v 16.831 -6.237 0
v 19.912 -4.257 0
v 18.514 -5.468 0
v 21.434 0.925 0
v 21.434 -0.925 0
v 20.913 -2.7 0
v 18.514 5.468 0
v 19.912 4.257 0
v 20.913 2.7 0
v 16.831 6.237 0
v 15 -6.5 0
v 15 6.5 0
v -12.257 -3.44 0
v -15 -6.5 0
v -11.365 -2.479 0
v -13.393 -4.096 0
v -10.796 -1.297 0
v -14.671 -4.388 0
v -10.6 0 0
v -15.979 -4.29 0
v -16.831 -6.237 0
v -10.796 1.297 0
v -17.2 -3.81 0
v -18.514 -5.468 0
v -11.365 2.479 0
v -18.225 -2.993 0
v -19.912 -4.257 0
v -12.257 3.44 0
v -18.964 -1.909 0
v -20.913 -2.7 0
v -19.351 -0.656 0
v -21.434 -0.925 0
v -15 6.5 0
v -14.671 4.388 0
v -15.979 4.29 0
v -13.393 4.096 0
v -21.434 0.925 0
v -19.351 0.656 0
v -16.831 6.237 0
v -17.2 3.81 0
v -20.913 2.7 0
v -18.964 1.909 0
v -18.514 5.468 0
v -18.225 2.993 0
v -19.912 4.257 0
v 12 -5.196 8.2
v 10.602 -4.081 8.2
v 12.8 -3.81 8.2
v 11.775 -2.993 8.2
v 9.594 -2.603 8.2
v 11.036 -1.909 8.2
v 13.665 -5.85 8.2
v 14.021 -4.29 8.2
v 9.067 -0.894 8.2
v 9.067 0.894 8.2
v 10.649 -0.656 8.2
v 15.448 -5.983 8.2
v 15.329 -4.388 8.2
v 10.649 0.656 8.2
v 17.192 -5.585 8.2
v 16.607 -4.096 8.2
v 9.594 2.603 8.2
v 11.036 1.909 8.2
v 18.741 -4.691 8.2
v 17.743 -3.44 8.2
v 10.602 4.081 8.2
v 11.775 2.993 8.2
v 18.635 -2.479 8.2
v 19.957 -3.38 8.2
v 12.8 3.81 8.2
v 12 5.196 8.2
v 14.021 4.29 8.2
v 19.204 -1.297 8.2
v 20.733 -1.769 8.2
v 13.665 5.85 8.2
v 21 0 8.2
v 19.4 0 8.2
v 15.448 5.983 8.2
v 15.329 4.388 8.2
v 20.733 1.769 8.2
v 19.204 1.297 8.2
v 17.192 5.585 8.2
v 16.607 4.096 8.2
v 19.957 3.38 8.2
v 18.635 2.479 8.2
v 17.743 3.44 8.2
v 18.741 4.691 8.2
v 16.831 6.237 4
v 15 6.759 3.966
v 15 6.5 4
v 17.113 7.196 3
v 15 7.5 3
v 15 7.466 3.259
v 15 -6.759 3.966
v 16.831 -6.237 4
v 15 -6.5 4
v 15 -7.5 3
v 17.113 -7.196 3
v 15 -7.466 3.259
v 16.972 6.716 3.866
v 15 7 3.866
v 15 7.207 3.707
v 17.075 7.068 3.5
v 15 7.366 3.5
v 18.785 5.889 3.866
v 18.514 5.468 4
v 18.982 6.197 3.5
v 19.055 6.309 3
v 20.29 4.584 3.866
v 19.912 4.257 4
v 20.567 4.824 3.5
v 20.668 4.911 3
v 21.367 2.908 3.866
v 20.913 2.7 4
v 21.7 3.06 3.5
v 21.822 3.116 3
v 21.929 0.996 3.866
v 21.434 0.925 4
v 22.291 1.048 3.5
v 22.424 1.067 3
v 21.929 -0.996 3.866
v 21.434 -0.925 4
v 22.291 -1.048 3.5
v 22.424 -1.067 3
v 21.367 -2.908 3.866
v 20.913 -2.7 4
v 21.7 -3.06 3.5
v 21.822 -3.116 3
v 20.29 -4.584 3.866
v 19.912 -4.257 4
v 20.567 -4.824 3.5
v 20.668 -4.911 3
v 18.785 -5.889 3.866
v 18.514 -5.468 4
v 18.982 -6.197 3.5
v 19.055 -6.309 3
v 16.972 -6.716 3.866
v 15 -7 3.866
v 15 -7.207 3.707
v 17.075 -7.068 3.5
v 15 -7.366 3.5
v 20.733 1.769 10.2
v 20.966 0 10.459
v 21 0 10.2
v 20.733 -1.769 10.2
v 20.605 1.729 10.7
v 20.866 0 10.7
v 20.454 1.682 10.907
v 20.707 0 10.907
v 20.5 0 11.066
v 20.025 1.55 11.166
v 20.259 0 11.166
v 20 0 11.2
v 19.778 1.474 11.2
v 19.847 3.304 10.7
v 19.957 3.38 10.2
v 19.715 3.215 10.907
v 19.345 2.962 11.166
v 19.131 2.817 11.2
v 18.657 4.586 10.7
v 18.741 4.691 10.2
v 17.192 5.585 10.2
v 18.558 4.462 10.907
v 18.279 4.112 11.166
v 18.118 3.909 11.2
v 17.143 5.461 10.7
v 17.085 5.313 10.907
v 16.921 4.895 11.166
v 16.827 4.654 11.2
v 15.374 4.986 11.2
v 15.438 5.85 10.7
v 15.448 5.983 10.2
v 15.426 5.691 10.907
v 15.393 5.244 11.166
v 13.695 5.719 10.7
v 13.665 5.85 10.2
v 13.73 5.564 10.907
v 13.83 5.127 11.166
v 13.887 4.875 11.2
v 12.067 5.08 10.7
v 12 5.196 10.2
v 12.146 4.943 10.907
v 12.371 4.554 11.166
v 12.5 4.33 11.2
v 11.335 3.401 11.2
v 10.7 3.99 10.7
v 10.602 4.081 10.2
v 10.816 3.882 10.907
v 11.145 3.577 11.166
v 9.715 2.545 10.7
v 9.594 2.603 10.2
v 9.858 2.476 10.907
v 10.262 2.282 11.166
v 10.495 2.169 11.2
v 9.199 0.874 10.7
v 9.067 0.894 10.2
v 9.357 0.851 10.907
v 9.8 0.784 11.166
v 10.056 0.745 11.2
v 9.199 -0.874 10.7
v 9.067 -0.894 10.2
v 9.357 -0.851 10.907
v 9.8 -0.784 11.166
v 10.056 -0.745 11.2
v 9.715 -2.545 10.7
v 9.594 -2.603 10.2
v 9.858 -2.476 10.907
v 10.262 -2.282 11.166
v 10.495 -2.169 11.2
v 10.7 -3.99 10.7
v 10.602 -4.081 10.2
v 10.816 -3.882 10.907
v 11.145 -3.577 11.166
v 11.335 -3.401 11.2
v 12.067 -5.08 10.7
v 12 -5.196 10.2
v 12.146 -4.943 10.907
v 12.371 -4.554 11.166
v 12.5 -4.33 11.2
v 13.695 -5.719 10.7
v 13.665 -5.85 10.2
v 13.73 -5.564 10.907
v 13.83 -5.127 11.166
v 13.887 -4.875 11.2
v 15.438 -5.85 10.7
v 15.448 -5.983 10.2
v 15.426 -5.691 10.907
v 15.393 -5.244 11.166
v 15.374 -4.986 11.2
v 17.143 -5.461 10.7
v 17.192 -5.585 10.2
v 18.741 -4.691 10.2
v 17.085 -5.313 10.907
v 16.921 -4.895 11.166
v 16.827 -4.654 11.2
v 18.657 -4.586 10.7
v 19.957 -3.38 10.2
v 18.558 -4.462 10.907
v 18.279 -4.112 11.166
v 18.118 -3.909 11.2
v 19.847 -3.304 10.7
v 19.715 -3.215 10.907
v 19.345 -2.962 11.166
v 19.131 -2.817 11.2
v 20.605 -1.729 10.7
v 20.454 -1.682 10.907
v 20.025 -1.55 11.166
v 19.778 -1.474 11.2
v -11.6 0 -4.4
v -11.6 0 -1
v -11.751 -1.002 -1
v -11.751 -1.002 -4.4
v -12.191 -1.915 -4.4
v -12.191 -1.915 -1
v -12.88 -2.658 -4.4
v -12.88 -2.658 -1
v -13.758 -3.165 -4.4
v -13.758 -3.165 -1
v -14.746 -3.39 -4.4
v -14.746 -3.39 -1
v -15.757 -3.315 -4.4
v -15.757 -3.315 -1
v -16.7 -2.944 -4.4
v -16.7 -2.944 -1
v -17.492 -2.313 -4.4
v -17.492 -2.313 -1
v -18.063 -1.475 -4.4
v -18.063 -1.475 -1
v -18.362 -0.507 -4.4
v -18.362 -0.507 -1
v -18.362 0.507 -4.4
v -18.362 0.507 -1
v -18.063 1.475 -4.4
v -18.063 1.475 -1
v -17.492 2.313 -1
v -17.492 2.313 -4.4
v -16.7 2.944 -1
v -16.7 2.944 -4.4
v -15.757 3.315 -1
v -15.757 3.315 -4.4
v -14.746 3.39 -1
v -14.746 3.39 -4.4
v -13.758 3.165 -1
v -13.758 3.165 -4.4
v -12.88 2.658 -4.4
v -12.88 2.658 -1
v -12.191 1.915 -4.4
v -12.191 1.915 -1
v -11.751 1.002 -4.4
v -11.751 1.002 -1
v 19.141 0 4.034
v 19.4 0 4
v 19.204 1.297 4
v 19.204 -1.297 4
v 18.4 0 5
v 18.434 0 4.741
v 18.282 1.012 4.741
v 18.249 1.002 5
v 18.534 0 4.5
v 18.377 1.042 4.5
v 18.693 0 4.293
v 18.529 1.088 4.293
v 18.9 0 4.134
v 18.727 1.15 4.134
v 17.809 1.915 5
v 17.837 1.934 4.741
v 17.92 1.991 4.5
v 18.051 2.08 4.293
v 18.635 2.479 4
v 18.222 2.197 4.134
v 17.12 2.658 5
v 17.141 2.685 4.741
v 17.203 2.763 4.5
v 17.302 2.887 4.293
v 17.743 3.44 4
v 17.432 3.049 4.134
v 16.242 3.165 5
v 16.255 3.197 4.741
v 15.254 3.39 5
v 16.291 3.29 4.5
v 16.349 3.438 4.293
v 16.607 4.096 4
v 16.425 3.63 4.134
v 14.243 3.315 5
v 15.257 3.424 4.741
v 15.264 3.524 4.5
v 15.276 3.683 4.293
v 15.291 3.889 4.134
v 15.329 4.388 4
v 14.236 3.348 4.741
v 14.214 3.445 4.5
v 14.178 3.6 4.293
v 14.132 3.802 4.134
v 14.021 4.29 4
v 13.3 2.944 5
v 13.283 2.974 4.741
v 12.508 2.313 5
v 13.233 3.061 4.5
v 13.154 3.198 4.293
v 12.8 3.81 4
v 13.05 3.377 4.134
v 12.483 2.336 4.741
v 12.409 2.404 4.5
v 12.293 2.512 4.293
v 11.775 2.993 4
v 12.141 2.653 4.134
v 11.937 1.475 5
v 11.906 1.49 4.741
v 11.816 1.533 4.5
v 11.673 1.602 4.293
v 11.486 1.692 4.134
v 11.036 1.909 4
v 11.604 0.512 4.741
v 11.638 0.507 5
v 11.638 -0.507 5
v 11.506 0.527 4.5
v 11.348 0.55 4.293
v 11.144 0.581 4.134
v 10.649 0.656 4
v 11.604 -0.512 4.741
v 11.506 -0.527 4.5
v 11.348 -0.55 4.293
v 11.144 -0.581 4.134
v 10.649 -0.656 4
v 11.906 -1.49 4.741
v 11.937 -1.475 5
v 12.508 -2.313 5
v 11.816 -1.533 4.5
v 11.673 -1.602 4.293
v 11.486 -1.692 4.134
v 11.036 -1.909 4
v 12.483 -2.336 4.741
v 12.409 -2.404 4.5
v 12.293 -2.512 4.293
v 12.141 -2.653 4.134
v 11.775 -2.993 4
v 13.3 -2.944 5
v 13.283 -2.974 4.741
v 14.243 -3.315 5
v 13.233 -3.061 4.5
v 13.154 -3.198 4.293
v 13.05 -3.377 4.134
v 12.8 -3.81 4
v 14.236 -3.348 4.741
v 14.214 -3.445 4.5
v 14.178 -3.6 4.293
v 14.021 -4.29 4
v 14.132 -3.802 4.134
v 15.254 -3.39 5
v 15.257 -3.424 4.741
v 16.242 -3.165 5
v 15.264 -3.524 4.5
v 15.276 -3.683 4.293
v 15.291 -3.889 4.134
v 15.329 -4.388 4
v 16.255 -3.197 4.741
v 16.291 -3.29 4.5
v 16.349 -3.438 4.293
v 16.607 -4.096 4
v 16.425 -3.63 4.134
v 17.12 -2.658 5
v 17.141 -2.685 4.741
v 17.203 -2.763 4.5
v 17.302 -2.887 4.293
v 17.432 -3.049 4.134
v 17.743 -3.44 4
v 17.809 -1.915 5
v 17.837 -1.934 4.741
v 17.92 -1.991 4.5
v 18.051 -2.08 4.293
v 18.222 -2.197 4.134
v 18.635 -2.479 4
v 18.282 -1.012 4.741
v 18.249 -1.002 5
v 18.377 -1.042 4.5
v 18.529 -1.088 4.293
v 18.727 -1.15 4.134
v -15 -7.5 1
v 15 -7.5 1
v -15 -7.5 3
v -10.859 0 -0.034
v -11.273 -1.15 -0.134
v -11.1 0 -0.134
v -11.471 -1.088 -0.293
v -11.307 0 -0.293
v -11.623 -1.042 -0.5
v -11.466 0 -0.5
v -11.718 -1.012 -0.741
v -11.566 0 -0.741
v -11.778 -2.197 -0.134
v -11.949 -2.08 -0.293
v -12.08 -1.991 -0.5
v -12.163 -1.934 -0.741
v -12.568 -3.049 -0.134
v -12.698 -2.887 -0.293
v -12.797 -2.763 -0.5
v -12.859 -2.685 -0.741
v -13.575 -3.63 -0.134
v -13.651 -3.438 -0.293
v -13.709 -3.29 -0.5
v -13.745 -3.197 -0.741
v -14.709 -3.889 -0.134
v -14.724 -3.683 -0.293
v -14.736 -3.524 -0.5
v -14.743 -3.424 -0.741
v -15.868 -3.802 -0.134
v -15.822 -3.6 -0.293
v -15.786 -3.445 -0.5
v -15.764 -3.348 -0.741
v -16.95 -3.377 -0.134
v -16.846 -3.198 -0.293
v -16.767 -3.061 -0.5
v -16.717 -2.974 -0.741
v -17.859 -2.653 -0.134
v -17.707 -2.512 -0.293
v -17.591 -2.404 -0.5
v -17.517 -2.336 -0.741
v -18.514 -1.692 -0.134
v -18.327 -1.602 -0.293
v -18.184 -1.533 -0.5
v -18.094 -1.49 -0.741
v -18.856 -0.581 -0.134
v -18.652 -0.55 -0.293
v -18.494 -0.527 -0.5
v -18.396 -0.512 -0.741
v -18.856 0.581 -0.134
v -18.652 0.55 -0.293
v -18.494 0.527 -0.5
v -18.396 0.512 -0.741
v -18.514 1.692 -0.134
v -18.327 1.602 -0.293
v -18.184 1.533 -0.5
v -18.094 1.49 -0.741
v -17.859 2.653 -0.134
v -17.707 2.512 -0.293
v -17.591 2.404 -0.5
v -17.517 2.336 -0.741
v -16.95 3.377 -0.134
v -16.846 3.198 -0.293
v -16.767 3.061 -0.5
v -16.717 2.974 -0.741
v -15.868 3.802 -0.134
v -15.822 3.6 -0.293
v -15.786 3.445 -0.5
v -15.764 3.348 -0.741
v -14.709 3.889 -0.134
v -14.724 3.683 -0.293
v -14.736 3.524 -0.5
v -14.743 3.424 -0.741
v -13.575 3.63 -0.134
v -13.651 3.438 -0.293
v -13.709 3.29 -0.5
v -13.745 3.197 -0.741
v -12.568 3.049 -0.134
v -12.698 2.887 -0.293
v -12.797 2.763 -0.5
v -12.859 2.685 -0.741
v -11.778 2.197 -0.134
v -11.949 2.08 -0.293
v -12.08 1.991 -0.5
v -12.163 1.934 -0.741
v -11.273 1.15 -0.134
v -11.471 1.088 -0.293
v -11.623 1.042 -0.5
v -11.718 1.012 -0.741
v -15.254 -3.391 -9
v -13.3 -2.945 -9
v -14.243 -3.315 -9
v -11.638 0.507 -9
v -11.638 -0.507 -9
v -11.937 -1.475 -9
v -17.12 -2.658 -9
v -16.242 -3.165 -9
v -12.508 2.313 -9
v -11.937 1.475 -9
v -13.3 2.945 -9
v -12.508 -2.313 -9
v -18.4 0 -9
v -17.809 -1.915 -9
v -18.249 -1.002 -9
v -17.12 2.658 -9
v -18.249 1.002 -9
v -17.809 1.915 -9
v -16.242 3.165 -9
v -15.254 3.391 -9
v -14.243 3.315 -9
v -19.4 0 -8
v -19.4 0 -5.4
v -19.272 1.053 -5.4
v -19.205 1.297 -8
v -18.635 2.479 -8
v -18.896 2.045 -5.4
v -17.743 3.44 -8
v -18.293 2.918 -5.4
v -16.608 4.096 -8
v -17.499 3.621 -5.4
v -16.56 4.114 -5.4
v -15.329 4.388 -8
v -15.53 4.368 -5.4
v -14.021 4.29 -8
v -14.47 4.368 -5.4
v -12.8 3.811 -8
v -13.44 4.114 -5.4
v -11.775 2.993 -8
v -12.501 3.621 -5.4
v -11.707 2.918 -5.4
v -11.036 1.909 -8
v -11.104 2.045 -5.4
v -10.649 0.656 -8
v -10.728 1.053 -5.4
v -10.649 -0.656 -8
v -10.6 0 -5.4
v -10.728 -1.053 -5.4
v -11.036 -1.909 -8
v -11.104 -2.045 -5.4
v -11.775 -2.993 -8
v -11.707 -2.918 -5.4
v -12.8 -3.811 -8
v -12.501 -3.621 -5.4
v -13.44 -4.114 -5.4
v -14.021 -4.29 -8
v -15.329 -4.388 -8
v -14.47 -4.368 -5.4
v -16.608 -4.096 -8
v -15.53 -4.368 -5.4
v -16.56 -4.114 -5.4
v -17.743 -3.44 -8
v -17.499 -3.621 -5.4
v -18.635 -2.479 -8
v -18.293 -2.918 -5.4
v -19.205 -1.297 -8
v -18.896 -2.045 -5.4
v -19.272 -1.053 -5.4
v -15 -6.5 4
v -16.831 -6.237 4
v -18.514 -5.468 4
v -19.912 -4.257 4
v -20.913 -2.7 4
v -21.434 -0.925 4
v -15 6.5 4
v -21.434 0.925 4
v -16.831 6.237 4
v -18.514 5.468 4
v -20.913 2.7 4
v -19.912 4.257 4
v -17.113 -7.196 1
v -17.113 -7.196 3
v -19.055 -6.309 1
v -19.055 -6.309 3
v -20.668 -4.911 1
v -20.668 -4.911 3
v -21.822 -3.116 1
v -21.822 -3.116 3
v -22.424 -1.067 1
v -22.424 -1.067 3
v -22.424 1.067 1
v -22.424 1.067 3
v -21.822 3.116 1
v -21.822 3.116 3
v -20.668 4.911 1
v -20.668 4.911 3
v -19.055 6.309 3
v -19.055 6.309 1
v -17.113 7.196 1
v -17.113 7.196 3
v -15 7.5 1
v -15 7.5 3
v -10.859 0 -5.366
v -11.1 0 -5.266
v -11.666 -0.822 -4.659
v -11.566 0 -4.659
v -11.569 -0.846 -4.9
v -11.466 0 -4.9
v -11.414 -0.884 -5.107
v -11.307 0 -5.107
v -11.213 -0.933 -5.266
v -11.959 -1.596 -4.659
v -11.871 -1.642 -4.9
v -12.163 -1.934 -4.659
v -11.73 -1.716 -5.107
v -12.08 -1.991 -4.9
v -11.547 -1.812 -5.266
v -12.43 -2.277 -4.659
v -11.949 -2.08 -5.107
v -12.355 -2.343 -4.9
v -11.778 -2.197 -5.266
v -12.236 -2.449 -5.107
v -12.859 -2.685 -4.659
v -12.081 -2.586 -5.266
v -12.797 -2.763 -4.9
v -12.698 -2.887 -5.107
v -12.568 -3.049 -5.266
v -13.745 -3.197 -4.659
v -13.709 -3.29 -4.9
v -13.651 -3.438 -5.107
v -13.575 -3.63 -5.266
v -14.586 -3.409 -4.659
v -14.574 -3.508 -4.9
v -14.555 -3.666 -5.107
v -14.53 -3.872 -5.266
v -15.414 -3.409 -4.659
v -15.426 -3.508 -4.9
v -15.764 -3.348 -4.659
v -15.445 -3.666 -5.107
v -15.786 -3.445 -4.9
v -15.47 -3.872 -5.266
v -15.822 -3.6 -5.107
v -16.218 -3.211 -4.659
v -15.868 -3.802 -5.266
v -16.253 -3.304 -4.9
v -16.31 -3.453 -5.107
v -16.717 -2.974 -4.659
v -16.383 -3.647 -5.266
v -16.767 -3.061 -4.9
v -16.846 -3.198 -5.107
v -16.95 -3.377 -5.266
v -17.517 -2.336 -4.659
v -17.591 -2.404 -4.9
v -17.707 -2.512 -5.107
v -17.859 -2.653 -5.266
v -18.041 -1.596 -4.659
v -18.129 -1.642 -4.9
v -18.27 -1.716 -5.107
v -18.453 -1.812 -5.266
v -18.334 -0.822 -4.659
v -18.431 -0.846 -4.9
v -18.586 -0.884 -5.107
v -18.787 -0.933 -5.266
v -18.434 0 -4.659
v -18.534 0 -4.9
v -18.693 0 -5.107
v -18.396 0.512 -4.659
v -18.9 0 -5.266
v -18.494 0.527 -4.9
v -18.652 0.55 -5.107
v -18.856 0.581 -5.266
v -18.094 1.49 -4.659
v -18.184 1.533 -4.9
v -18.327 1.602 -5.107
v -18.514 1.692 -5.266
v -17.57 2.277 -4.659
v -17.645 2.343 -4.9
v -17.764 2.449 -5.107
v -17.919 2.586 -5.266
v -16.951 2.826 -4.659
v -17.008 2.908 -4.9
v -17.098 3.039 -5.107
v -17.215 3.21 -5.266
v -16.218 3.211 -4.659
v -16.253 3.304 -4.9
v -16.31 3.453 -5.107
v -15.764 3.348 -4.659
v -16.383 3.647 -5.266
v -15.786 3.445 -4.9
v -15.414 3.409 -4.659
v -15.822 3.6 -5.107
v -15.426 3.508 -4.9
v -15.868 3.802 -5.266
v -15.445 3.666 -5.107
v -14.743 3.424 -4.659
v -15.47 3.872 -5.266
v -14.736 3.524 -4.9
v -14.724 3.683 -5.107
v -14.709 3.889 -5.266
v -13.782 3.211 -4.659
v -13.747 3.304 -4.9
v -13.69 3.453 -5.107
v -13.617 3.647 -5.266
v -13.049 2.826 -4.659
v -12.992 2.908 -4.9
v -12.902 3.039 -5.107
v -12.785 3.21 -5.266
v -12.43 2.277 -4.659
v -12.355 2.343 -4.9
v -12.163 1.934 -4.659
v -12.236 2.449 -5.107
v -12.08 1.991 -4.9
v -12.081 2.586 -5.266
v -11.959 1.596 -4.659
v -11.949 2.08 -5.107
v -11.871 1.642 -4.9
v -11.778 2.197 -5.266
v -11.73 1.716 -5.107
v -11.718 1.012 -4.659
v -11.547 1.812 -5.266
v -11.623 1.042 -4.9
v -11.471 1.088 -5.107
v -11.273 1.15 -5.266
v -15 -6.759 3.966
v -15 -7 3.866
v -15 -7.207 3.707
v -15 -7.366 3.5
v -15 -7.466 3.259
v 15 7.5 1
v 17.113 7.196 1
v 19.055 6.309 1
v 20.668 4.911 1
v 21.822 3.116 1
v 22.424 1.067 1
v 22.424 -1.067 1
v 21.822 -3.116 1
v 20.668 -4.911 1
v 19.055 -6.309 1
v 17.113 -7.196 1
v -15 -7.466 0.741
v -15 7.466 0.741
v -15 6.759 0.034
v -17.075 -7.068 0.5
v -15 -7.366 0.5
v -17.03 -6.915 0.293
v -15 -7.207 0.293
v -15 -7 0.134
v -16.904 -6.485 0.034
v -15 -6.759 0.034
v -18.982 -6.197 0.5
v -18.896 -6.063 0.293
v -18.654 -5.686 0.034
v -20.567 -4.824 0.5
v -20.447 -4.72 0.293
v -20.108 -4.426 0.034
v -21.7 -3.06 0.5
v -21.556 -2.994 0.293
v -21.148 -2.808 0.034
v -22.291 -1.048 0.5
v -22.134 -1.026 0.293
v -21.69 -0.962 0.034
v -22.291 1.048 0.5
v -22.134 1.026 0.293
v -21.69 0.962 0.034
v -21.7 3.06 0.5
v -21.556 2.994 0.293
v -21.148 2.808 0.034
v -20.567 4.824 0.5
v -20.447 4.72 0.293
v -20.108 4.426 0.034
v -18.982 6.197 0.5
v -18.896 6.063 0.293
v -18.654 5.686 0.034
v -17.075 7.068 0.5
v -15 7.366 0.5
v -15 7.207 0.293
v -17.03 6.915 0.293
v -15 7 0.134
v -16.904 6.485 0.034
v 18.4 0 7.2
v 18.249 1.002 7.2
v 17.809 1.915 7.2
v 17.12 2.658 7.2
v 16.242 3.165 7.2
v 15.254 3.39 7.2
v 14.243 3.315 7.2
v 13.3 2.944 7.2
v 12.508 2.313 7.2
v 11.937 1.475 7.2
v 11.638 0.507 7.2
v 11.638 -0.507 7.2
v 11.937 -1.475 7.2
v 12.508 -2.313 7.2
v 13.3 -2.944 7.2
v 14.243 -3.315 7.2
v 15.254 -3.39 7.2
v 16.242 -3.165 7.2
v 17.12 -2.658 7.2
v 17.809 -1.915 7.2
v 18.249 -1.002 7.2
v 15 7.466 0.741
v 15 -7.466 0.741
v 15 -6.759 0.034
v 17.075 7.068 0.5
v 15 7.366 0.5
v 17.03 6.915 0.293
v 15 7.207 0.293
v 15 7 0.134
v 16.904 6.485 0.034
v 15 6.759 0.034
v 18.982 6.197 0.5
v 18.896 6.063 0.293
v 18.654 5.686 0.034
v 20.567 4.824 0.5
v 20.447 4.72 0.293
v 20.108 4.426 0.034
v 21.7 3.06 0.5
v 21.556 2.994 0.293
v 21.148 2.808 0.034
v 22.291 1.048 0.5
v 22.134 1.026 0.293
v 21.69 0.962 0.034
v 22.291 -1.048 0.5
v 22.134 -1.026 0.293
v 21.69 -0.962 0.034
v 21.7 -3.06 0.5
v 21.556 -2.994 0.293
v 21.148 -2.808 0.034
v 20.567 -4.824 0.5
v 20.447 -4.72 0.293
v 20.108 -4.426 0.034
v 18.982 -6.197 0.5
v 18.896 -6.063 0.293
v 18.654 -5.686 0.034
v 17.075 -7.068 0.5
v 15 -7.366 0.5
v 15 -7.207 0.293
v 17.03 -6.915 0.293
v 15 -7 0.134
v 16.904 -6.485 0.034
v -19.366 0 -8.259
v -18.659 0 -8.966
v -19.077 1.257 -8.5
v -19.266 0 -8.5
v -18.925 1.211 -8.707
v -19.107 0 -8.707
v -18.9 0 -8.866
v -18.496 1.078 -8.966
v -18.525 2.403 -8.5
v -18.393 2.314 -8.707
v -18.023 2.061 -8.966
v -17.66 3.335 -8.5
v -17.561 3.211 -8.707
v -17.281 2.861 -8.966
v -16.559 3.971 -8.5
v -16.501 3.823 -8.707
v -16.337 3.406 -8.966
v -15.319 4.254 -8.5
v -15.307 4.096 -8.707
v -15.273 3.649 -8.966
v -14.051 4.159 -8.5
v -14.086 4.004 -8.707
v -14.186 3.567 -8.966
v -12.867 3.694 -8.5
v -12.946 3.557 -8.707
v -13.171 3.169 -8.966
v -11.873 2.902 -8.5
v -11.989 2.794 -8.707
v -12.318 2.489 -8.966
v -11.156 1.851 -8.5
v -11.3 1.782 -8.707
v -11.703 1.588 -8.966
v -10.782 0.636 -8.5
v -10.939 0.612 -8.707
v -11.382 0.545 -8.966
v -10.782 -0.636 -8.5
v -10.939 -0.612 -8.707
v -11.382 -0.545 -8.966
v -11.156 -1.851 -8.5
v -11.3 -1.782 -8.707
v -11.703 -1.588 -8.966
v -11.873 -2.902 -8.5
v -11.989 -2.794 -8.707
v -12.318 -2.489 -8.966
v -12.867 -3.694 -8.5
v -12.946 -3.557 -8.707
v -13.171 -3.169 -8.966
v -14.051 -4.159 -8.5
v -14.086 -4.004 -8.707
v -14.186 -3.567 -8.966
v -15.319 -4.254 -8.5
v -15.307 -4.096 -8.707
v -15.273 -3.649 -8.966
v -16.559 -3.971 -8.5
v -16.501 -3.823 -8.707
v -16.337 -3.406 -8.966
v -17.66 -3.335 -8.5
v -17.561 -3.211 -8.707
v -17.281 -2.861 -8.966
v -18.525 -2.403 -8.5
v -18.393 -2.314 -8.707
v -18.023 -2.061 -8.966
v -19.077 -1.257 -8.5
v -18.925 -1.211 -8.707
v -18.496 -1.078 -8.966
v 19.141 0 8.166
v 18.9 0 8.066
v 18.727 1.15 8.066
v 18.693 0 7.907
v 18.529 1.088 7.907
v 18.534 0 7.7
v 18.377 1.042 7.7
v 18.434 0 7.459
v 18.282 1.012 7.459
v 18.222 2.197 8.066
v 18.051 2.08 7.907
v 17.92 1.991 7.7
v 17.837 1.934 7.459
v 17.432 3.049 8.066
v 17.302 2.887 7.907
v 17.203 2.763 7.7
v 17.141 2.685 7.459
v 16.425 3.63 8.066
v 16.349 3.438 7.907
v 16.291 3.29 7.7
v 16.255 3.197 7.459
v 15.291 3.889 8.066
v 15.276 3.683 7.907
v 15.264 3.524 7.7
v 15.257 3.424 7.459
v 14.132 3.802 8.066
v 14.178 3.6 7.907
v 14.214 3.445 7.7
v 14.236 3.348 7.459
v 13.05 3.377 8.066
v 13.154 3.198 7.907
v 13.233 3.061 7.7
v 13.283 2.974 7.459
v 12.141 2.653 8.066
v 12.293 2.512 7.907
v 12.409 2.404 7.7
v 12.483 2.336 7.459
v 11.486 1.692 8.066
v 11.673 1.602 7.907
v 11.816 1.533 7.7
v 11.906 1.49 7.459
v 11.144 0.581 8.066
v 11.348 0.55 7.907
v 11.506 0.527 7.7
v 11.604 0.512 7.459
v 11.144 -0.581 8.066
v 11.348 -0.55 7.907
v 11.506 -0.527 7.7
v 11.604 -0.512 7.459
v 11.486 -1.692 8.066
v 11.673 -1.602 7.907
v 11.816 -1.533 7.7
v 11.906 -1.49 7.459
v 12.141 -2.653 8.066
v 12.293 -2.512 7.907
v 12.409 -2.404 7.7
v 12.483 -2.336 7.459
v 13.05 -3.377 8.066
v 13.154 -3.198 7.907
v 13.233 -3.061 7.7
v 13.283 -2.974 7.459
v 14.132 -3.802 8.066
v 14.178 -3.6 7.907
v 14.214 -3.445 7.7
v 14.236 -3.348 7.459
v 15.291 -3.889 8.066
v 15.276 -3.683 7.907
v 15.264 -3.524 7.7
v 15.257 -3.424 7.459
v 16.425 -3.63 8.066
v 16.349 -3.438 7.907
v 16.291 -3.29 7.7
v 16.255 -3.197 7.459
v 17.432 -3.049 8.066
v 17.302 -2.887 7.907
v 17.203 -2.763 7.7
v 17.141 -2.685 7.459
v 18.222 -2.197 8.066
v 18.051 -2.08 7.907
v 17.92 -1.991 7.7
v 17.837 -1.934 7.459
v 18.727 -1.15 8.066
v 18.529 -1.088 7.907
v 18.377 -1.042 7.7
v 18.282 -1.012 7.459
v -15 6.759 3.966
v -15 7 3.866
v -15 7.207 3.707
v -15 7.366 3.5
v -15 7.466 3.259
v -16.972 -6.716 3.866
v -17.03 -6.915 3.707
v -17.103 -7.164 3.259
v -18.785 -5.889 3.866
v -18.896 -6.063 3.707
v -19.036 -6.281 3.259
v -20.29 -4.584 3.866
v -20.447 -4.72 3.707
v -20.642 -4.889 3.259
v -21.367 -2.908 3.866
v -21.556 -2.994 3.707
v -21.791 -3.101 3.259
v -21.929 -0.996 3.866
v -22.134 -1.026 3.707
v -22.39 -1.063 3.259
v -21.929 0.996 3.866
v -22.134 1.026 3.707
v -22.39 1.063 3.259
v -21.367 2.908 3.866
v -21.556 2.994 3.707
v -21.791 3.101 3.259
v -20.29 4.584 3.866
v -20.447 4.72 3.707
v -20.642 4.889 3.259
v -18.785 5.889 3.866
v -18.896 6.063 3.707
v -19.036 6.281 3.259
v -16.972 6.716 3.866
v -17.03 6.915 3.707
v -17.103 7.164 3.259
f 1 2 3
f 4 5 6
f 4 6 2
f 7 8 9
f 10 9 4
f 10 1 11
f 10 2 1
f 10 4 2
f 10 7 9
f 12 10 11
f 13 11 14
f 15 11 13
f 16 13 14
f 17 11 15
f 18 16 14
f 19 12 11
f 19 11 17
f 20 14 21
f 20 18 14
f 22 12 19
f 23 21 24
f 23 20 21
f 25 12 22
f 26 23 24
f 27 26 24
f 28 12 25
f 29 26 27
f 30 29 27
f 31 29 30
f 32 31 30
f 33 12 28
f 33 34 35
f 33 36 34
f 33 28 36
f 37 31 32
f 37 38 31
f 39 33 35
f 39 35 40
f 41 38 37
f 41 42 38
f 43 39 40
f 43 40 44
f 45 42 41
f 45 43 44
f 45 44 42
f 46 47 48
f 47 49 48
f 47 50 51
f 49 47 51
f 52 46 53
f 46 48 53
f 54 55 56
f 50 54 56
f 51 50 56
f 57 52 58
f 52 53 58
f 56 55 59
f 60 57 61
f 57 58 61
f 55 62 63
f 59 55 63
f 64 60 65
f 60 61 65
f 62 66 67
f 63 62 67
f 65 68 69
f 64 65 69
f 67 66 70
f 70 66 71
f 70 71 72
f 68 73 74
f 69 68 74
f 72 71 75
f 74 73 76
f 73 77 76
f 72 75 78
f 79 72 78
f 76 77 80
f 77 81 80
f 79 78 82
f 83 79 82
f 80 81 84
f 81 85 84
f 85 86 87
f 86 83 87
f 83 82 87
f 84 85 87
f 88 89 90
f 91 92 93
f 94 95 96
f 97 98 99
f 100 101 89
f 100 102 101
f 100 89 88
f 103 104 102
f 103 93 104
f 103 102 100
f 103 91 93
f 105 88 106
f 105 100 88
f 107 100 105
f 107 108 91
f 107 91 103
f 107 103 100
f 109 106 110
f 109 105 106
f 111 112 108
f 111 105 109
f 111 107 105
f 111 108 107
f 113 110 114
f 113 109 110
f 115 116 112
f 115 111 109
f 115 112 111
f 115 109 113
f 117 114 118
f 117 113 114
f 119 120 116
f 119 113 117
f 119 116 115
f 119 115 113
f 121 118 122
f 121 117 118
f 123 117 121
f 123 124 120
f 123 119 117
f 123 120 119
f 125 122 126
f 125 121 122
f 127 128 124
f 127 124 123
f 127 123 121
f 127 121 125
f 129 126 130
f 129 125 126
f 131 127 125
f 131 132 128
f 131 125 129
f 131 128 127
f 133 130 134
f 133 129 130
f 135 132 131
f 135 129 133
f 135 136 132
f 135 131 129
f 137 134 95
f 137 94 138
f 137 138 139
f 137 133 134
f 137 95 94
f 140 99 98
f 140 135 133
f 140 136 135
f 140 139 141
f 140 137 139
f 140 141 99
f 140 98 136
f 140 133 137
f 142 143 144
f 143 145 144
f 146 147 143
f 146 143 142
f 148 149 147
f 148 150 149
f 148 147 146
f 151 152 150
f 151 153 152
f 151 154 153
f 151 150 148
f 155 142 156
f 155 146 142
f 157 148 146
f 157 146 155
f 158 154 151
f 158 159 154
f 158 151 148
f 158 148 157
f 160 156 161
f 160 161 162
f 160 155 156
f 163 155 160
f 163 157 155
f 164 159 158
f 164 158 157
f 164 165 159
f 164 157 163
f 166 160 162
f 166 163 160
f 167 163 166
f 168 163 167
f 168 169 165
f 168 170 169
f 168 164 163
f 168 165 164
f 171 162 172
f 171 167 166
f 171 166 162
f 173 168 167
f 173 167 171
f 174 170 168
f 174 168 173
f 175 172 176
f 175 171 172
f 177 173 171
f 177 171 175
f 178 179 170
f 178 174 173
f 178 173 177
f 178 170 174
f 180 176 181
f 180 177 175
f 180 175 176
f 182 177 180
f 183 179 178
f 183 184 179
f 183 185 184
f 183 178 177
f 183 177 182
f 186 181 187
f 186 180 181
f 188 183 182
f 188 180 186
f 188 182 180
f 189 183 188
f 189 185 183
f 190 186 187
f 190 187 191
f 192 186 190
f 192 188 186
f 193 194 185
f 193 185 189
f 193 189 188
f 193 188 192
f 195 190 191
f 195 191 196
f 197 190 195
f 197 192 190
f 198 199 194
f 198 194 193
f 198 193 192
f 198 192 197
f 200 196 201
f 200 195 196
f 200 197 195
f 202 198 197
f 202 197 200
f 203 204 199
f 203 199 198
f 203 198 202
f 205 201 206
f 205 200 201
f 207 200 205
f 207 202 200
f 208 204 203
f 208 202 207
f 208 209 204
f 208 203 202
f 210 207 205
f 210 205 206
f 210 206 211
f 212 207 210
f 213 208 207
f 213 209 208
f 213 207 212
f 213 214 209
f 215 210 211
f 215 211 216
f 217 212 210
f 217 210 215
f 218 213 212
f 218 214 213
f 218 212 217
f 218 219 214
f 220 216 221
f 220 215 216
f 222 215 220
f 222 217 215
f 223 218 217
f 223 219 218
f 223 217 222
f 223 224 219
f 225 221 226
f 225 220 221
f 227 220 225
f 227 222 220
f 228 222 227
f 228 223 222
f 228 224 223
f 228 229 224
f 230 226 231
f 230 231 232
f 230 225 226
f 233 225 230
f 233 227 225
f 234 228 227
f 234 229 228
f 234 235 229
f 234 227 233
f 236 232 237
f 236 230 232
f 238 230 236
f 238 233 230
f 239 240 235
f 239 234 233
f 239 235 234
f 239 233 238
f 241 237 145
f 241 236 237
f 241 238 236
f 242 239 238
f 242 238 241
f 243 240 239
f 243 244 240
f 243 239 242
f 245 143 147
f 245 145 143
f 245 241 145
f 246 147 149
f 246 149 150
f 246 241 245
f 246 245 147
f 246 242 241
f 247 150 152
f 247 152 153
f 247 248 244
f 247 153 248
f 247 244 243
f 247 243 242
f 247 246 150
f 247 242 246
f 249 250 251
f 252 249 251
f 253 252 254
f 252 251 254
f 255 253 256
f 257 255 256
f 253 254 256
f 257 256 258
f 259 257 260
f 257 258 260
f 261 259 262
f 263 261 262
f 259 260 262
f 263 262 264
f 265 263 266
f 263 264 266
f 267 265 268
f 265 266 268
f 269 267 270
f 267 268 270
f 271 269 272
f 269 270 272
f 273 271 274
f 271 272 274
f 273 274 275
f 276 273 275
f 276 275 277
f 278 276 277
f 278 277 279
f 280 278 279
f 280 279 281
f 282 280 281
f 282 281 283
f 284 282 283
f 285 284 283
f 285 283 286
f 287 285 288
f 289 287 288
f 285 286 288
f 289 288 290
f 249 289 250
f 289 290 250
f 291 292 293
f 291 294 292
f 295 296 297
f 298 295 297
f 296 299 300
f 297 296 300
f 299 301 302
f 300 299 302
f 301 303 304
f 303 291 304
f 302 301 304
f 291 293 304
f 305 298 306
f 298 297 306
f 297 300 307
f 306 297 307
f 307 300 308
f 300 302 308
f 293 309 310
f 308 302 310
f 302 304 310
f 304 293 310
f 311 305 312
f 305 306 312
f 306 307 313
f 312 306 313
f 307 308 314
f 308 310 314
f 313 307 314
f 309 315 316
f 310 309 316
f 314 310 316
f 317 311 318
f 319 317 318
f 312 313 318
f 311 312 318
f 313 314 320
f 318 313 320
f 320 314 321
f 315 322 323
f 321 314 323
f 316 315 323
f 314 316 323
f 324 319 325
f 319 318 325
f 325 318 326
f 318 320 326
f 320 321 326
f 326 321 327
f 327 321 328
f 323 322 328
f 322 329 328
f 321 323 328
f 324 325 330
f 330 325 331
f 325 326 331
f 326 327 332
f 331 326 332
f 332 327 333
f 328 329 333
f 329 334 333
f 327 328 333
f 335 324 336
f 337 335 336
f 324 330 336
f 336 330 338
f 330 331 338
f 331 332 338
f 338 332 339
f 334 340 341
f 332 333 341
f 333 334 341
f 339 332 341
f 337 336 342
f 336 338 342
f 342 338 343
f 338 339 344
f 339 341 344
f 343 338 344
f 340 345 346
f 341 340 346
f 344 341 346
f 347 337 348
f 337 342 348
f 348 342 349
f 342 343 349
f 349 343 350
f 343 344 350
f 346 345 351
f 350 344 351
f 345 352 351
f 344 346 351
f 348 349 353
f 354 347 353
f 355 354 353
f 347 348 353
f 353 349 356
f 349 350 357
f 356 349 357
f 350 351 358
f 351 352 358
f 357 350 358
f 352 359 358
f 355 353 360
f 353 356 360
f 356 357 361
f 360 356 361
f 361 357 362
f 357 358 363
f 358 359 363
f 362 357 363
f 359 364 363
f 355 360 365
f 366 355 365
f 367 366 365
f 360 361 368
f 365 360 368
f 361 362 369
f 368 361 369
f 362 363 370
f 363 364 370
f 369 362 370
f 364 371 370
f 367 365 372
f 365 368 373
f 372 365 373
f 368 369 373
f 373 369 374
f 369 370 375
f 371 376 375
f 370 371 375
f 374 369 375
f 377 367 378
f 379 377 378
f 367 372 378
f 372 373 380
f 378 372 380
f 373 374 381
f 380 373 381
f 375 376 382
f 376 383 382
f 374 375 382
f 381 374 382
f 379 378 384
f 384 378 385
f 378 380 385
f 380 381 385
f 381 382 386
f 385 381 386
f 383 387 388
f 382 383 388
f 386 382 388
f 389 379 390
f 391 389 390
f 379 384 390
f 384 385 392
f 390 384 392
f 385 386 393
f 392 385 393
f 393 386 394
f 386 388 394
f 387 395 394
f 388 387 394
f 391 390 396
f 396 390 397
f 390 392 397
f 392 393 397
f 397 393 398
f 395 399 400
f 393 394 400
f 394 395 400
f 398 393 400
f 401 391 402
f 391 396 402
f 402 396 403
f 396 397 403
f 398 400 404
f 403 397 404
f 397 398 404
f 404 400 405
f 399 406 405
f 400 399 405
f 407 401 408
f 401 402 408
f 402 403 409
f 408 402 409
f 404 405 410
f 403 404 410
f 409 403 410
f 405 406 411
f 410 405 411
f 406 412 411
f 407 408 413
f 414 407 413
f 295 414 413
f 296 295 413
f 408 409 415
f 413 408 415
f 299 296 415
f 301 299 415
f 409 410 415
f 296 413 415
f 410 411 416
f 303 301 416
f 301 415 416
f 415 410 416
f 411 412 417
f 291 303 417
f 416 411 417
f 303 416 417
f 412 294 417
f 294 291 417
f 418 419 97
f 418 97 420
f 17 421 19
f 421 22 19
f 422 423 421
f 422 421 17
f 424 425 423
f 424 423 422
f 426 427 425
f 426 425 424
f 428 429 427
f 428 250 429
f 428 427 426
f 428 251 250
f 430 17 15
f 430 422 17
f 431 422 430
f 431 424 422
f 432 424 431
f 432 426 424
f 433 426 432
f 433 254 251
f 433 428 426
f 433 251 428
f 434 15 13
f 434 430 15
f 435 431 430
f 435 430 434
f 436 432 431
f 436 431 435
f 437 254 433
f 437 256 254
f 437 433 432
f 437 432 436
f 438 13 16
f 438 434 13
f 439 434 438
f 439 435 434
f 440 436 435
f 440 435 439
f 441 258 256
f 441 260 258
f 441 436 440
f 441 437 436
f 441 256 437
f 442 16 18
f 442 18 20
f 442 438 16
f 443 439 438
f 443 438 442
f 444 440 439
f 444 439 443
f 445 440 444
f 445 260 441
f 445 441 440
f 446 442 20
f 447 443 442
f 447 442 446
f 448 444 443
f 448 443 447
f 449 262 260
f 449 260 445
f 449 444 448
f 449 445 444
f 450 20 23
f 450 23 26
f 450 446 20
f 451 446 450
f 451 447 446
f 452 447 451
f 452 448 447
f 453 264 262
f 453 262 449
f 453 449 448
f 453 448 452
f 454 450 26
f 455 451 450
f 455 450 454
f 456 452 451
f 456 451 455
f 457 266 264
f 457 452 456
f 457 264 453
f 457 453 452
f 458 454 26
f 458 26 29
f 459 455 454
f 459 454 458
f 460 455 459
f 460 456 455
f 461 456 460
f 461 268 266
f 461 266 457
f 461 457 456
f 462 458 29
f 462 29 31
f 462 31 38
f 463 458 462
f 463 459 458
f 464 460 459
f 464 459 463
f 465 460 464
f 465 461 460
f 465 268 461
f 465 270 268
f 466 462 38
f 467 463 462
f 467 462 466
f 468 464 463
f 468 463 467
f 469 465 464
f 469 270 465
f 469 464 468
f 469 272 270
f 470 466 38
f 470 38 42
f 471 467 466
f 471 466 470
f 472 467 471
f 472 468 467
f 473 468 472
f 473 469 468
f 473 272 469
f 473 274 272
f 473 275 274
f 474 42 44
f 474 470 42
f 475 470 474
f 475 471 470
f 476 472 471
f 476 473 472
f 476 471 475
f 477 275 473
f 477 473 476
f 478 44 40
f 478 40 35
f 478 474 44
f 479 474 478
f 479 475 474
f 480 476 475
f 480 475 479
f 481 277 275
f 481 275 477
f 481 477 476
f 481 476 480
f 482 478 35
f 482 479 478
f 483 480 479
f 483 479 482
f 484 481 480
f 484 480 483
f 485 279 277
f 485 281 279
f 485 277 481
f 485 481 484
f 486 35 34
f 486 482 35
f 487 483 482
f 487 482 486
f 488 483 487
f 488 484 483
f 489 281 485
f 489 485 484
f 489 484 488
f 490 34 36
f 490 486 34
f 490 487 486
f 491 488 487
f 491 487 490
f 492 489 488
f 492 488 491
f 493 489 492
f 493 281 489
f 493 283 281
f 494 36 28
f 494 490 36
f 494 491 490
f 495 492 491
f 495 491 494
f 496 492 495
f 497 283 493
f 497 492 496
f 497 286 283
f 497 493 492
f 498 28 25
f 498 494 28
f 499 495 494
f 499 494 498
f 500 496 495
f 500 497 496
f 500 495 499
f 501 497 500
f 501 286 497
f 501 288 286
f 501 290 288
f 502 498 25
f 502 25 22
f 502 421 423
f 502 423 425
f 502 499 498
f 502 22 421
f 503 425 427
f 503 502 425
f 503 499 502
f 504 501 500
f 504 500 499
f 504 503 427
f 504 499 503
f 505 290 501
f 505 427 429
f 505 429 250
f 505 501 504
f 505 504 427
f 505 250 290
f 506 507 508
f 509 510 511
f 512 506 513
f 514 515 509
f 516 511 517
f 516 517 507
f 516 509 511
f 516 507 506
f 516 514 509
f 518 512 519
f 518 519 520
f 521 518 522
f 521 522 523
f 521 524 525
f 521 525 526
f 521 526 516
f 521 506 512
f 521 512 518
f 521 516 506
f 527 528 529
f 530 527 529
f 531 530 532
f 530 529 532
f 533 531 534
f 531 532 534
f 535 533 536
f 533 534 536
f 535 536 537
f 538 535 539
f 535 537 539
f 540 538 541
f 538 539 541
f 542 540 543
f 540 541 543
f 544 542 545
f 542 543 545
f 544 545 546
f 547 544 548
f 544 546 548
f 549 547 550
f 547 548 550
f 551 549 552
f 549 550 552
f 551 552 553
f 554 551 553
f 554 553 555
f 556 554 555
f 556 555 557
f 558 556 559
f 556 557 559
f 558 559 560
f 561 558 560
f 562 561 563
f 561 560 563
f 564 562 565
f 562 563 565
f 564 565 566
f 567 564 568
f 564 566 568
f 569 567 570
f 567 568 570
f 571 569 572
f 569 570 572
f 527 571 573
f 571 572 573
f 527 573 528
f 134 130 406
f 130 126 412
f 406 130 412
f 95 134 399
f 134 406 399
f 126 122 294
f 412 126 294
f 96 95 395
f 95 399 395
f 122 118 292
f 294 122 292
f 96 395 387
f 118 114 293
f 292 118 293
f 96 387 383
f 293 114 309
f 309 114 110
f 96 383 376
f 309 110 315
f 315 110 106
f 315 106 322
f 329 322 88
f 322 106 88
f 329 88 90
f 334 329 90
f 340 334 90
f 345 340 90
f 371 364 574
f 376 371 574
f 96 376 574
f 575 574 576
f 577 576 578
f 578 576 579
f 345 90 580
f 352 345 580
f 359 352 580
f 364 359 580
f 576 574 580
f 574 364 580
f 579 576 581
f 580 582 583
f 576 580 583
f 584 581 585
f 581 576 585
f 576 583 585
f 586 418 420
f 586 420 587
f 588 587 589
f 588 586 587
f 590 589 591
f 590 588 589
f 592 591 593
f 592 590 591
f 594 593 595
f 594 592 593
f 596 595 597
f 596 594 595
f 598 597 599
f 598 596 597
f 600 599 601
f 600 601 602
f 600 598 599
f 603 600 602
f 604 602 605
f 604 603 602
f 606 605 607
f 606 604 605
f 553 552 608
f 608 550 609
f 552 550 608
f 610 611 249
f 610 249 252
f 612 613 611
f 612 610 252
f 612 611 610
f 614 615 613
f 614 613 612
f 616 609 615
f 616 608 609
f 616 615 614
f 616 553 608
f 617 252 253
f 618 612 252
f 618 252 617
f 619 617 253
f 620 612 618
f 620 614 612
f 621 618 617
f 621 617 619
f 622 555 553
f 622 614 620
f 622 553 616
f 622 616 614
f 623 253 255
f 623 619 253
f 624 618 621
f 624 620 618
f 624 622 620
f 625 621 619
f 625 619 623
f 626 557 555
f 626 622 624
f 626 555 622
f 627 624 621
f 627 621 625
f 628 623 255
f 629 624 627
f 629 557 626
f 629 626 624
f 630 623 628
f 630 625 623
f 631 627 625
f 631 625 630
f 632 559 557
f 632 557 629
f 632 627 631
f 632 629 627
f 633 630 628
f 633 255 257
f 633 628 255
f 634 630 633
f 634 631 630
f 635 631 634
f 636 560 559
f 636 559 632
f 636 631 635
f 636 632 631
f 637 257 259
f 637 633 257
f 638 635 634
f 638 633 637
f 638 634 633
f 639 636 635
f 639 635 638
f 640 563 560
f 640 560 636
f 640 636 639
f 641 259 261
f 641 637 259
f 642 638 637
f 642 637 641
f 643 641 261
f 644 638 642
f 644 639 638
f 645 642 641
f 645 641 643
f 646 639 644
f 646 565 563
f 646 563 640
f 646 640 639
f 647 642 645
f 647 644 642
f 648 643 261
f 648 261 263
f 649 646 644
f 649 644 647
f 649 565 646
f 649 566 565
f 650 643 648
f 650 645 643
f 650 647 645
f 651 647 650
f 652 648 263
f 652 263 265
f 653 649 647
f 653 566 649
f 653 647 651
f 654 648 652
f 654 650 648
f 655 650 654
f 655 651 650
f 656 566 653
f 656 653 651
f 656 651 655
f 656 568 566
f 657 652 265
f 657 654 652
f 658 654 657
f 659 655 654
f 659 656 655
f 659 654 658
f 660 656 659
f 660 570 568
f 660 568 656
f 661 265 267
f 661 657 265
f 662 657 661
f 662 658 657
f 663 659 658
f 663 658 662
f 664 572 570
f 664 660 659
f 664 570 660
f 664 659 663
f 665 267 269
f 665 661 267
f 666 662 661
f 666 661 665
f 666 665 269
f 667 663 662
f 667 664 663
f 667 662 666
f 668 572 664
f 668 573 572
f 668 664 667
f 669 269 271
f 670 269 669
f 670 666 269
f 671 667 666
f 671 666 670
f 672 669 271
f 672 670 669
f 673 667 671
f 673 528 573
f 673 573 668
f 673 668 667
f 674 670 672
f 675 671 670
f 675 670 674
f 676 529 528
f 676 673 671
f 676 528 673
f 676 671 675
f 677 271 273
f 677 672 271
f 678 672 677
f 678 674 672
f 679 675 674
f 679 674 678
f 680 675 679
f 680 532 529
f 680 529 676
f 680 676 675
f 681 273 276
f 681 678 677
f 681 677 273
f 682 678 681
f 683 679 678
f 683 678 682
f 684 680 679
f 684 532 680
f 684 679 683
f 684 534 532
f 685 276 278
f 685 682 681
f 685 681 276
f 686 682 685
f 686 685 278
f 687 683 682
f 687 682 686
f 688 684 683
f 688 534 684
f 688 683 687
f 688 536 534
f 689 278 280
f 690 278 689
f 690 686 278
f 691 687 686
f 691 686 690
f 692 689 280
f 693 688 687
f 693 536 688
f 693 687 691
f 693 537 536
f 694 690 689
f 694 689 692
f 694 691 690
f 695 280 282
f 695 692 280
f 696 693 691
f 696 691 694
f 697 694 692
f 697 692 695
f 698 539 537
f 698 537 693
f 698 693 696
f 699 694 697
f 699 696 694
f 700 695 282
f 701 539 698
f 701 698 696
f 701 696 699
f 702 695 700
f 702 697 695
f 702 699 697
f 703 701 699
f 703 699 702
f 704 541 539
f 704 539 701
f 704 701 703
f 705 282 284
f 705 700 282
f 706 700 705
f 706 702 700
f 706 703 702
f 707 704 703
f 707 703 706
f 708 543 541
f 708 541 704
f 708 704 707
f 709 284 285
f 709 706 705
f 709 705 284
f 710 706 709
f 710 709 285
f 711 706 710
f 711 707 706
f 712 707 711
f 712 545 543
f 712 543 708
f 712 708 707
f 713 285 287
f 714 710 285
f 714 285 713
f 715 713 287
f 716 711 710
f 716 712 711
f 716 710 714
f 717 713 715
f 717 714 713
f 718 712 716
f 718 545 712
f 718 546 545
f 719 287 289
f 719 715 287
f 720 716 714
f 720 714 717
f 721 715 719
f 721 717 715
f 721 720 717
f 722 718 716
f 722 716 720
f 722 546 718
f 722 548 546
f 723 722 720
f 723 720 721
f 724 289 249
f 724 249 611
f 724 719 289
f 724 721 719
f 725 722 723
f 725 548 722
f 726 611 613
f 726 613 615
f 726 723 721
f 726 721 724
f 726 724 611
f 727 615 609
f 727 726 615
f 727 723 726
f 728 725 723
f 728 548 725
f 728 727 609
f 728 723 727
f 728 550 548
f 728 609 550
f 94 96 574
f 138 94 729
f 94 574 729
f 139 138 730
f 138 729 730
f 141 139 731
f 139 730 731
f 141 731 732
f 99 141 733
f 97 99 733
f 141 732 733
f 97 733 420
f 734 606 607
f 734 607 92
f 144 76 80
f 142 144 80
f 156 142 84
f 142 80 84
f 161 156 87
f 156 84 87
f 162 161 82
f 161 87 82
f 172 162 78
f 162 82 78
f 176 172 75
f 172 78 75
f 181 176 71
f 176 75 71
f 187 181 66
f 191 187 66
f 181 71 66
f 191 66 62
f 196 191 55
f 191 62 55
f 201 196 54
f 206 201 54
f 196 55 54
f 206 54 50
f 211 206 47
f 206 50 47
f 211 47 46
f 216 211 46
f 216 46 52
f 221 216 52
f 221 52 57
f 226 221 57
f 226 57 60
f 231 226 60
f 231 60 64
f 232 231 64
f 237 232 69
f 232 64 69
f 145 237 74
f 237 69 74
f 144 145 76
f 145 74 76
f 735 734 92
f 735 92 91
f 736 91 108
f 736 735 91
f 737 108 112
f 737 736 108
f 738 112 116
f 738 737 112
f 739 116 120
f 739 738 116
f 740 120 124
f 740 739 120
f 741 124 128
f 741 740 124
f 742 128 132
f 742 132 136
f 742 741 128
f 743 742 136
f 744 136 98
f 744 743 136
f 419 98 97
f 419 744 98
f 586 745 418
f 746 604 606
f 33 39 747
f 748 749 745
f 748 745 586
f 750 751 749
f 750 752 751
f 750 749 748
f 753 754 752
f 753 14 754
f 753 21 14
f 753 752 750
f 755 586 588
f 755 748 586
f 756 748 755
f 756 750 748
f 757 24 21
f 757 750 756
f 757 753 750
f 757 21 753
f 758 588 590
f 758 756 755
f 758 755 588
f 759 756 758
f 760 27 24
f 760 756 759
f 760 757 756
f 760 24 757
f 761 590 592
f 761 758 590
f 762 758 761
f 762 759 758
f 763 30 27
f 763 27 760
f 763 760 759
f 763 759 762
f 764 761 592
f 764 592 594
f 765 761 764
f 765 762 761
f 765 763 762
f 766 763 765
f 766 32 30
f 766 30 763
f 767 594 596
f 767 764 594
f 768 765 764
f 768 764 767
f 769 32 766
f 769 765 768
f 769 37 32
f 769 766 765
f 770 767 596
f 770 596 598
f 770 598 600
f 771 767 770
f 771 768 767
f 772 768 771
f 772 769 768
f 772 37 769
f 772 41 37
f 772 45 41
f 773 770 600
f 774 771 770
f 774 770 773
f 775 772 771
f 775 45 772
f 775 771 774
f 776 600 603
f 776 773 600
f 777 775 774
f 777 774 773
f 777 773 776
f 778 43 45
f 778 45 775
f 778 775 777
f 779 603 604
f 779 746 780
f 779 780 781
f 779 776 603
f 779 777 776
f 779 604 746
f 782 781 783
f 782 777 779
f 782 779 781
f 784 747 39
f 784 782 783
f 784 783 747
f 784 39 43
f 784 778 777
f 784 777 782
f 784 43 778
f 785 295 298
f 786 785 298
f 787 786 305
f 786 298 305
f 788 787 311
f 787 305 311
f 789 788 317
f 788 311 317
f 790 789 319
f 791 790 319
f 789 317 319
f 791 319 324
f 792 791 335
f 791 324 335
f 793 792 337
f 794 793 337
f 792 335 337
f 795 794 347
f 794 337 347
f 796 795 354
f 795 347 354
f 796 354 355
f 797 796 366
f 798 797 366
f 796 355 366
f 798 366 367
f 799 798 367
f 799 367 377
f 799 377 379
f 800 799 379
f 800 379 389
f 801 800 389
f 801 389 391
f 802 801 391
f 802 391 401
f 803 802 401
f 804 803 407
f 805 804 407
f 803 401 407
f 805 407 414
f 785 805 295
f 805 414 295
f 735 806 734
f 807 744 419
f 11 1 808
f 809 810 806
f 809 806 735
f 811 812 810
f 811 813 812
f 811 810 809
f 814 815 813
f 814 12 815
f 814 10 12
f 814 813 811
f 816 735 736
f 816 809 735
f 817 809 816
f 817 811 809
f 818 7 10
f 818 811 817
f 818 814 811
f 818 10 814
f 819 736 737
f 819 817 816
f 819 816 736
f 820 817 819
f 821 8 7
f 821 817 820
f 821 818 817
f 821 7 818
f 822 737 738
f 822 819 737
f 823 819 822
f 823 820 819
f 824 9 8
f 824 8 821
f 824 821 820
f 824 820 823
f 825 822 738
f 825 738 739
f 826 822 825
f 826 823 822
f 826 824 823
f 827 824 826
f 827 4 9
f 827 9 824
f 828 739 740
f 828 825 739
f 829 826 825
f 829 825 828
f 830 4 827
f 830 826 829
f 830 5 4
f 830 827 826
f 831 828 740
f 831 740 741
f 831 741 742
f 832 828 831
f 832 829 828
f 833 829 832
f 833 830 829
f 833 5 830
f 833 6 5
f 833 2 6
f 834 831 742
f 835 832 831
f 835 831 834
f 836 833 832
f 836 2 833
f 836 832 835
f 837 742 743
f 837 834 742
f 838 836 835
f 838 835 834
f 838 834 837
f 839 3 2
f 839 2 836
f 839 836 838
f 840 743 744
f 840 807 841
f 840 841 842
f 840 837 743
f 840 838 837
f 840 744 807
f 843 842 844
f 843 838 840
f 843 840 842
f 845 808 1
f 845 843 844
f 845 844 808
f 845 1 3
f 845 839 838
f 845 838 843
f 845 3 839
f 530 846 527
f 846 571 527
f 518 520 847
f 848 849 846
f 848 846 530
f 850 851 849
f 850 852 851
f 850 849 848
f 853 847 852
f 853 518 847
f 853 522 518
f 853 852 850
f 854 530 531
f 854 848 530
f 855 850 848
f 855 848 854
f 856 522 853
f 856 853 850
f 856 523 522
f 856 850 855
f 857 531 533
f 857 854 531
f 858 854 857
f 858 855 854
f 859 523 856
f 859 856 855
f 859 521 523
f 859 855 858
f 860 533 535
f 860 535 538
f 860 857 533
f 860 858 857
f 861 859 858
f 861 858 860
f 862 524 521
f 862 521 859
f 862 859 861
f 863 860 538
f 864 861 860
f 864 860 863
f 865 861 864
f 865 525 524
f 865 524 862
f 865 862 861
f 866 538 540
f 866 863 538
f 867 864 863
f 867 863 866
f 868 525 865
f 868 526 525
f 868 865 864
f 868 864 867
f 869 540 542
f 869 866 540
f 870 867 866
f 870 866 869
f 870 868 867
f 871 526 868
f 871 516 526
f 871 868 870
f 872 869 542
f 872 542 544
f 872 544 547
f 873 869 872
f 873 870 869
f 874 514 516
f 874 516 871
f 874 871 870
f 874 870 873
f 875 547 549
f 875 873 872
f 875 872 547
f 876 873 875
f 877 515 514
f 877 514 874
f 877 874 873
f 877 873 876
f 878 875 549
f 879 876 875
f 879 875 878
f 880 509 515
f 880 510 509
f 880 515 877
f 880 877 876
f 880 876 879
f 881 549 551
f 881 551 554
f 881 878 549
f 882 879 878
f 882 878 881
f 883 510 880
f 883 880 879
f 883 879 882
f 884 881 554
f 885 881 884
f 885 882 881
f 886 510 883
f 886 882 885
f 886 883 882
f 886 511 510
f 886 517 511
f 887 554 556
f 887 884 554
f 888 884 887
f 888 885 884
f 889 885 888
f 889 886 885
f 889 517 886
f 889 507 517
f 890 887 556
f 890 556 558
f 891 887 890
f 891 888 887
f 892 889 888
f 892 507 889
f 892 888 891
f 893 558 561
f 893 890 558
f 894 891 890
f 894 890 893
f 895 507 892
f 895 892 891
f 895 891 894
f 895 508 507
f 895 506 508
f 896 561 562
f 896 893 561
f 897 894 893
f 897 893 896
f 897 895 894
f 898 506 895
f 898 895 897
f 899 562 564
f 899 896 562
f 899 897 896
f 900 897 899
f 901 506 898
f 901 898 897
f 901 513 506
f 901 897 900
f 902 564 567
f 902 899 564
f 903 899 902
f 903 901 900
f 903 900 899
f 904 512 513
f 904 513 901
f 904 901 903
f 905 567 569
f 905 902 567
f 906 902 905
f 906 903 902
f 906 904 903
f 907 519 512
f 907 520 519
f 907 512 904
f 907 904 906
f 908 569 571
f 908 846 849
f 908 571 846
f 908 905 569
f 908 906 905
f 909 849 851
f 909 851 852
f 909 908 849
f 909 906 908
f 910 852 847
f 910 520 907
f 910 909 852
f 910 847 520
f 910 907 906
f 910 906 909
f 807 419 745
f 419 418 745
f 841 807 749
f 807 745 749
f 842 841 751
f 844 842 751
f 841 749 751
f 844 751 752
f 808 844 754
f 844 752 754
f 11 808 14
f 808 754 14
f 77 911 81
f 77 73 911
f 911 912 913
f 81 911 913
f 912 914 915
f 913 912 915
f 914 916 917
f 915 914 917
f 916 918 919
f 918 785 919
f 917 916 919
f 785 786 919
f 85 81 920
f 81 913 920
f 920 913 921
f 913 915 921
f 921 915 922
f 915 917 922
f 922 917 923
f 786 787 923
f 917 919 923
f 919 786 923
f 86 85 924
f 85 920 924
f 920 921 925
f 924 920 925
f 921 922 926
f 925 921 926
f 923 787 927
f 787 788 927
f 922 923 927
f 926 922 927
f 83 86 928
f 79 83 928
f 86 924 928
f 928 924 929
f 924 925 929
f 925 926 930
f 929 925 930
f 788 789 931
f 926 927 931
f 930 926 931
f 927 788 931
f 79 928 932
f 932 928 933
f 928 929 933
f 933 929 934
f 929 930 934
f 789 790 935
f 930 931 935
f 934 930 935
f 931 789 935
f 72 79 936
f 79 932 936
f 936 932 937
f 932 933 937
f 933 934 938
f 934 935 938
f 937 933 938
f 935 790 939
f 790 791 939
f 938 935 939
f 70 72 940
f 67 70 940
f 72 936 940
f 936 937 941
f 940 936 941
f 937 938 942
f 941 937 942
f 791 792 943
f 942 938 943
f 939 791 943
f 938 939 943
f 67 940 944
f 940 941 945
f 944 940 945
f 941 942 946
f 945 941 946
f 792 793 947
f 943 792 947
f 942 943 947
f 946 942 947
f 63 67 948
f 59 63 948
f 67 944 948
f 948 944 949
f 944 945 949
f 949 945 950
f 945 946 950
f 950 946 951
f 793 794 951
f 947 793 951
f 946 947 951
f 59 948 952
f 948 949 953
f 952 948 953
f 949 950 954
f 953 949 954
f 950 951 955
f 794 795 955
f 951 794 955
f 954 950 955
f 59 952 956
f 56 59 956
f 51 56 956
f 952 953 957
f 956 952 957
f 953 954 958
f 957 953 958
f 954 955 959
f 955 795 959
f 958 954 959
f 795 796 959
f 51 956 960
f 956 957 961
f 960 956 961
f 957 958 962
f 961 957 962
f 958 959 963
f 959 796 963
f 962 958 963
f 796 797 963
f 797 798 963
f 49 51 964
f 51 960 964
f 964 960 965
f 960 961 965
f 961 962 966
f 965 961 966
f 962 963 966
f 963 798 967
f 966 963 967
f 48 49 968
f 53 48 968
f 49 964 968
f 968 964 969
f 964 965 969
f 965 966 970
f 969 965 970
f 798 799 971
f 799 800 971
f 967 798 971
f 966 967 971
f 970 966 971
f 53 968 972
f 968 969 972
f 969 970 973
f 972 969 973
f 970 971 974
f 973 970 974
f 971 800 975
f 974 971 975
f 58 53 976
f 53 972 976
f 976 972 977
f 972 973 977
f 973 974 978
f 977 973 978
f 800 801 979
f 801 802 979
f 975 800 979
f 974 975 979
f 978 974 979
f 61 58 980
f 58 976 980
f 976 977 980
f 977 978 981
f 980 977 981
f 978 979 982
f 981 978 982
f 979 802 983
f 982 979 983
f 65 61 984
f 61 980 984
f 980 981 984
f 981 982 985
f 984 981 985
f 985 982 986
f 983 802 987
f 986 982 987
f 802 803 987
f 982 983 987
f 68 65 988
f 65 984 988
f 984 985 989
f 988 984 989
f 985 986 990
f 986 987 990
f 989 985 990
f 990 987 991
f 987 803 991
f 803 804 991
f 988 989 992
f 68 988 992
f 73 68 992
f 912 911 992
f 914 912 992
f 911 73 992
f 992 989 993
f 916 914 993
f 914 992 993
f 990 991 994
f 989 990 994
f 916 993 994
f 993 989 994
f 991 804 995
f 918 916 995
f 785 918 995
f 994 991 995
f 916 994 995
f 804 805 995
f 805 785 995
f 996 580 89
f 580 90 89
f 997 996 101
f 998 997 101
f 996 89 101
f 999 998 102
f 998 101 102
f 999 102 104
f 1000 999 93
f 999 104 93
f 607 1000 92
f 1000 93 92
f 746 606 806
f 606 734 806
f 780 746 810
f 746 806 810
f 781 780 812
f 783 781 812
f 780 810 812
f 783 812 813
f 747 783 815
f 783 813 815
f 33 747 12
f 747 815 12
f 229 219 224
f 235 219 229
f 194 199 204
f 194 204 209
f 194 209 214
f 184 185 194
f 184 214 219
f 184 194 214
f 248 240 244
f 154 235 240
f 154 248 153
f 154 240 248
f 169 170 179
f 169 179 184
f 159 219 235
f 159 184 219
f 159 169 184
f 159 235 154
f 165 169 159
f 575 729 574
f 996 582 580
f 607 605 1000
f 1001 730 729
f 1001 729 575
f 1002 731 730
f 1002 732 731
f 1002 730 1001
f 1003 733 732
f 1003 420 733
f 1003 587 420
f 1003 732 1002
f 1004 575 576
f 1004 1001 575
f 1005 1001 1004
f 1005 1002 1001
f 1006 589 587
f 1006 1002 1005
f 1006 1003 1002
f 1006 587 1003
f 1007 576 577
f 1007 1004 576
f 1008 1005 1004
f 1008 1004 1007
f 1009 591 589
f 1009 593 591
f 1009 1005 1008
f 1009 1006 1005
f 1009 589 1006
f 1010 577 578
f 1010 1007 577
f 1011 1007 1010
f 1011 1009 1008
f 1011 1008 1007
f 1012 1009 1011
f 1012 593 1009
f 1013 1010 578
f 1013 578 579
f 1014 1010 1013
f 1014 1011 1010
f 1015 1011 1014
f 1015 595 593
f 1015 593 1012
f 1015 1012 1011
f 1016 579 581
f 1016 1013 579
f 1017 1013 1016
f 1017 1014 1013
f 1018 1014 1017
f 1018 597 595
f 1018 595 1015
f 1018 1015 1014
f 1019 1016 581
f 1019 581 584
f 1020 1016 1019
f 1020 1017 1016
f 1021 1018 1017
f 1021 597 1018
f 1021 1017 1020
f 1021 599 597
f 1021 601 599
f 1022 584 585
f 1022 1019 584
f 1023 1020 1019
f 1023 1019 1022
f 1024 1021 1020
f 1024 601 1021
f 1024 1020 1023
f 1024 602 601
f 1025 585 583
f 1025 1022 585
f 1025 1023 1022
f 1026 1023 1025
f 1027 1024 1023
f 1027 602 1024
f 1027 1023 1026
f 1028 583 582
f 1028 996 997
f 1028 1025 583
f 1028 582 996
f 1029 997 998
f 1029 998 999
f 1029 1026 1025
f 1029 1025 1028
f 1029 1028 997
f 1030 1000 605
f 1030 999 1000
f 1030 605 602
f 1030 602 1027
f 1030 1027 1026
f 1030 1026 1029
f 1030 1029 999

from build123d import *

# Parameters (mm, degrees)
SKETCH1_R           = 3.5
BOSS_EXTRUDE2_DEPTH = 4
SKETCH2_R           = 3.4
BOSS_EXTRUDE3_DEPTH = 5.4
SKETCH4_R           = 4.4
BOSS_EXTRUDE4_DEPTH = 3.6
SKETCH5_R           = 3.5
BOSS_EXTRUDE5_DEPTH = 4
SKETCH6_R           = 3.4
BOSS_EXTRUDE6_DEPTH = 4.2
SKETCH7_R           = 6
BOSS_EXTRUDE7_DEPTH = 3
FILLET1_R           = 1


with BuildPart() as part:
    # Sketch1 → Boss-Extrude2 (new body)
    with BuildSketch(Plane.XY):
        with BuildLine():
            Line((-15, 7.5), (15, 7.5))
            ThreePointArc((15, 7.5), (22.5, 0), (15, -7.5))
            Line((15, -7.5), (-15, -7.5))
            ThreePointArc((-15, -7.5), (-22.5, 0), (-15, 7.5))
        make_face()
        with Locations((15, 0)):
            Circle(SKETCH1_R, mode=Mode.SUBTRACT)
    extrude(amount=BOSS_EXTRUDE2_DEPTH)

    # Sketch2 → Boss-Extrude3 (add)
    with BuildSketch(Plane(origin=(0, 0, 0), x_dir=(-1, 0, 0), z_dir=(0, 0, -1))):
        with Locations(Location((15, 0, 0), (0, 0, 180))):
            Circle(SKETCH2_R)
    extrude(amount=BOSS_EXTRUDE3_DEPTH)

    # Sketch4 → Boss-Extrude4 (add)
    with BuildSketch(Plane(origin=(0, 0, -5.4), x_dir=(-1, 0, 0), z_dir=(0, 0, -1))):
        with Locations((15, 0)):
            Circle(SKETCH4_R)
    extrude(amount=BOSS_EXTRUDE4_DEPTH)

    # Sketch5 → Boss-Extrude5 (add)
    with BuildSketch(Plane(origin=(0, 0, 0), x_dir=(-1, 0, 0), z_dir=(0, 0, -1))):
        with Locations((-15, 0)):
            Circle(SKETCH5_R)
    extrude(amount=-BOSS_EXTRUDE5_DEPTH)

    # Sketch6 → Boss-Extrude6 (add)
    with BuildSketch(Plane.XY.offset(4)):
        with Locations((15, 0)):
            Circle(SKETCH6_R)
    extrude(amount=BOSS_EXTRUDE6_DEPTH)

    # Sketch7 → Boss-Extrude7 (add)
    with BuildSketch(Plane.XY.offset(8.2)):
        with Locations((15, 0)):
            Circle(SKETCH7_R)
    extrude(amount=BOSS_EXTRUDE7_DEPTH)

    # Fillet1
    fillet1_edges = [part.edges().sort_by_distance(p)[0] for p in [
        (22.5, 0, 4),
        (0, 7.5, 4),
        (-18.4, 0, 0),
        (-18.4, 0, -5.4),
        (-10.6, 0, -9),
        (11.6, 0, 4),
        (11.6, 0, 8.2),
        (9, 0, 11.2),
        (-22.5, 0, 4),
        (0, 7.5, 0),
        (22.5, 0, 0),
        (0, -7.5, 0),
        (-22.5, 0, 0),
        (0, -7.5, 4),
    ]]
    fillet(fillet1_edges, radius=FILLET1_R - 0.0001)  # a hair under: the kernel refuses the full size


solid = part.part
